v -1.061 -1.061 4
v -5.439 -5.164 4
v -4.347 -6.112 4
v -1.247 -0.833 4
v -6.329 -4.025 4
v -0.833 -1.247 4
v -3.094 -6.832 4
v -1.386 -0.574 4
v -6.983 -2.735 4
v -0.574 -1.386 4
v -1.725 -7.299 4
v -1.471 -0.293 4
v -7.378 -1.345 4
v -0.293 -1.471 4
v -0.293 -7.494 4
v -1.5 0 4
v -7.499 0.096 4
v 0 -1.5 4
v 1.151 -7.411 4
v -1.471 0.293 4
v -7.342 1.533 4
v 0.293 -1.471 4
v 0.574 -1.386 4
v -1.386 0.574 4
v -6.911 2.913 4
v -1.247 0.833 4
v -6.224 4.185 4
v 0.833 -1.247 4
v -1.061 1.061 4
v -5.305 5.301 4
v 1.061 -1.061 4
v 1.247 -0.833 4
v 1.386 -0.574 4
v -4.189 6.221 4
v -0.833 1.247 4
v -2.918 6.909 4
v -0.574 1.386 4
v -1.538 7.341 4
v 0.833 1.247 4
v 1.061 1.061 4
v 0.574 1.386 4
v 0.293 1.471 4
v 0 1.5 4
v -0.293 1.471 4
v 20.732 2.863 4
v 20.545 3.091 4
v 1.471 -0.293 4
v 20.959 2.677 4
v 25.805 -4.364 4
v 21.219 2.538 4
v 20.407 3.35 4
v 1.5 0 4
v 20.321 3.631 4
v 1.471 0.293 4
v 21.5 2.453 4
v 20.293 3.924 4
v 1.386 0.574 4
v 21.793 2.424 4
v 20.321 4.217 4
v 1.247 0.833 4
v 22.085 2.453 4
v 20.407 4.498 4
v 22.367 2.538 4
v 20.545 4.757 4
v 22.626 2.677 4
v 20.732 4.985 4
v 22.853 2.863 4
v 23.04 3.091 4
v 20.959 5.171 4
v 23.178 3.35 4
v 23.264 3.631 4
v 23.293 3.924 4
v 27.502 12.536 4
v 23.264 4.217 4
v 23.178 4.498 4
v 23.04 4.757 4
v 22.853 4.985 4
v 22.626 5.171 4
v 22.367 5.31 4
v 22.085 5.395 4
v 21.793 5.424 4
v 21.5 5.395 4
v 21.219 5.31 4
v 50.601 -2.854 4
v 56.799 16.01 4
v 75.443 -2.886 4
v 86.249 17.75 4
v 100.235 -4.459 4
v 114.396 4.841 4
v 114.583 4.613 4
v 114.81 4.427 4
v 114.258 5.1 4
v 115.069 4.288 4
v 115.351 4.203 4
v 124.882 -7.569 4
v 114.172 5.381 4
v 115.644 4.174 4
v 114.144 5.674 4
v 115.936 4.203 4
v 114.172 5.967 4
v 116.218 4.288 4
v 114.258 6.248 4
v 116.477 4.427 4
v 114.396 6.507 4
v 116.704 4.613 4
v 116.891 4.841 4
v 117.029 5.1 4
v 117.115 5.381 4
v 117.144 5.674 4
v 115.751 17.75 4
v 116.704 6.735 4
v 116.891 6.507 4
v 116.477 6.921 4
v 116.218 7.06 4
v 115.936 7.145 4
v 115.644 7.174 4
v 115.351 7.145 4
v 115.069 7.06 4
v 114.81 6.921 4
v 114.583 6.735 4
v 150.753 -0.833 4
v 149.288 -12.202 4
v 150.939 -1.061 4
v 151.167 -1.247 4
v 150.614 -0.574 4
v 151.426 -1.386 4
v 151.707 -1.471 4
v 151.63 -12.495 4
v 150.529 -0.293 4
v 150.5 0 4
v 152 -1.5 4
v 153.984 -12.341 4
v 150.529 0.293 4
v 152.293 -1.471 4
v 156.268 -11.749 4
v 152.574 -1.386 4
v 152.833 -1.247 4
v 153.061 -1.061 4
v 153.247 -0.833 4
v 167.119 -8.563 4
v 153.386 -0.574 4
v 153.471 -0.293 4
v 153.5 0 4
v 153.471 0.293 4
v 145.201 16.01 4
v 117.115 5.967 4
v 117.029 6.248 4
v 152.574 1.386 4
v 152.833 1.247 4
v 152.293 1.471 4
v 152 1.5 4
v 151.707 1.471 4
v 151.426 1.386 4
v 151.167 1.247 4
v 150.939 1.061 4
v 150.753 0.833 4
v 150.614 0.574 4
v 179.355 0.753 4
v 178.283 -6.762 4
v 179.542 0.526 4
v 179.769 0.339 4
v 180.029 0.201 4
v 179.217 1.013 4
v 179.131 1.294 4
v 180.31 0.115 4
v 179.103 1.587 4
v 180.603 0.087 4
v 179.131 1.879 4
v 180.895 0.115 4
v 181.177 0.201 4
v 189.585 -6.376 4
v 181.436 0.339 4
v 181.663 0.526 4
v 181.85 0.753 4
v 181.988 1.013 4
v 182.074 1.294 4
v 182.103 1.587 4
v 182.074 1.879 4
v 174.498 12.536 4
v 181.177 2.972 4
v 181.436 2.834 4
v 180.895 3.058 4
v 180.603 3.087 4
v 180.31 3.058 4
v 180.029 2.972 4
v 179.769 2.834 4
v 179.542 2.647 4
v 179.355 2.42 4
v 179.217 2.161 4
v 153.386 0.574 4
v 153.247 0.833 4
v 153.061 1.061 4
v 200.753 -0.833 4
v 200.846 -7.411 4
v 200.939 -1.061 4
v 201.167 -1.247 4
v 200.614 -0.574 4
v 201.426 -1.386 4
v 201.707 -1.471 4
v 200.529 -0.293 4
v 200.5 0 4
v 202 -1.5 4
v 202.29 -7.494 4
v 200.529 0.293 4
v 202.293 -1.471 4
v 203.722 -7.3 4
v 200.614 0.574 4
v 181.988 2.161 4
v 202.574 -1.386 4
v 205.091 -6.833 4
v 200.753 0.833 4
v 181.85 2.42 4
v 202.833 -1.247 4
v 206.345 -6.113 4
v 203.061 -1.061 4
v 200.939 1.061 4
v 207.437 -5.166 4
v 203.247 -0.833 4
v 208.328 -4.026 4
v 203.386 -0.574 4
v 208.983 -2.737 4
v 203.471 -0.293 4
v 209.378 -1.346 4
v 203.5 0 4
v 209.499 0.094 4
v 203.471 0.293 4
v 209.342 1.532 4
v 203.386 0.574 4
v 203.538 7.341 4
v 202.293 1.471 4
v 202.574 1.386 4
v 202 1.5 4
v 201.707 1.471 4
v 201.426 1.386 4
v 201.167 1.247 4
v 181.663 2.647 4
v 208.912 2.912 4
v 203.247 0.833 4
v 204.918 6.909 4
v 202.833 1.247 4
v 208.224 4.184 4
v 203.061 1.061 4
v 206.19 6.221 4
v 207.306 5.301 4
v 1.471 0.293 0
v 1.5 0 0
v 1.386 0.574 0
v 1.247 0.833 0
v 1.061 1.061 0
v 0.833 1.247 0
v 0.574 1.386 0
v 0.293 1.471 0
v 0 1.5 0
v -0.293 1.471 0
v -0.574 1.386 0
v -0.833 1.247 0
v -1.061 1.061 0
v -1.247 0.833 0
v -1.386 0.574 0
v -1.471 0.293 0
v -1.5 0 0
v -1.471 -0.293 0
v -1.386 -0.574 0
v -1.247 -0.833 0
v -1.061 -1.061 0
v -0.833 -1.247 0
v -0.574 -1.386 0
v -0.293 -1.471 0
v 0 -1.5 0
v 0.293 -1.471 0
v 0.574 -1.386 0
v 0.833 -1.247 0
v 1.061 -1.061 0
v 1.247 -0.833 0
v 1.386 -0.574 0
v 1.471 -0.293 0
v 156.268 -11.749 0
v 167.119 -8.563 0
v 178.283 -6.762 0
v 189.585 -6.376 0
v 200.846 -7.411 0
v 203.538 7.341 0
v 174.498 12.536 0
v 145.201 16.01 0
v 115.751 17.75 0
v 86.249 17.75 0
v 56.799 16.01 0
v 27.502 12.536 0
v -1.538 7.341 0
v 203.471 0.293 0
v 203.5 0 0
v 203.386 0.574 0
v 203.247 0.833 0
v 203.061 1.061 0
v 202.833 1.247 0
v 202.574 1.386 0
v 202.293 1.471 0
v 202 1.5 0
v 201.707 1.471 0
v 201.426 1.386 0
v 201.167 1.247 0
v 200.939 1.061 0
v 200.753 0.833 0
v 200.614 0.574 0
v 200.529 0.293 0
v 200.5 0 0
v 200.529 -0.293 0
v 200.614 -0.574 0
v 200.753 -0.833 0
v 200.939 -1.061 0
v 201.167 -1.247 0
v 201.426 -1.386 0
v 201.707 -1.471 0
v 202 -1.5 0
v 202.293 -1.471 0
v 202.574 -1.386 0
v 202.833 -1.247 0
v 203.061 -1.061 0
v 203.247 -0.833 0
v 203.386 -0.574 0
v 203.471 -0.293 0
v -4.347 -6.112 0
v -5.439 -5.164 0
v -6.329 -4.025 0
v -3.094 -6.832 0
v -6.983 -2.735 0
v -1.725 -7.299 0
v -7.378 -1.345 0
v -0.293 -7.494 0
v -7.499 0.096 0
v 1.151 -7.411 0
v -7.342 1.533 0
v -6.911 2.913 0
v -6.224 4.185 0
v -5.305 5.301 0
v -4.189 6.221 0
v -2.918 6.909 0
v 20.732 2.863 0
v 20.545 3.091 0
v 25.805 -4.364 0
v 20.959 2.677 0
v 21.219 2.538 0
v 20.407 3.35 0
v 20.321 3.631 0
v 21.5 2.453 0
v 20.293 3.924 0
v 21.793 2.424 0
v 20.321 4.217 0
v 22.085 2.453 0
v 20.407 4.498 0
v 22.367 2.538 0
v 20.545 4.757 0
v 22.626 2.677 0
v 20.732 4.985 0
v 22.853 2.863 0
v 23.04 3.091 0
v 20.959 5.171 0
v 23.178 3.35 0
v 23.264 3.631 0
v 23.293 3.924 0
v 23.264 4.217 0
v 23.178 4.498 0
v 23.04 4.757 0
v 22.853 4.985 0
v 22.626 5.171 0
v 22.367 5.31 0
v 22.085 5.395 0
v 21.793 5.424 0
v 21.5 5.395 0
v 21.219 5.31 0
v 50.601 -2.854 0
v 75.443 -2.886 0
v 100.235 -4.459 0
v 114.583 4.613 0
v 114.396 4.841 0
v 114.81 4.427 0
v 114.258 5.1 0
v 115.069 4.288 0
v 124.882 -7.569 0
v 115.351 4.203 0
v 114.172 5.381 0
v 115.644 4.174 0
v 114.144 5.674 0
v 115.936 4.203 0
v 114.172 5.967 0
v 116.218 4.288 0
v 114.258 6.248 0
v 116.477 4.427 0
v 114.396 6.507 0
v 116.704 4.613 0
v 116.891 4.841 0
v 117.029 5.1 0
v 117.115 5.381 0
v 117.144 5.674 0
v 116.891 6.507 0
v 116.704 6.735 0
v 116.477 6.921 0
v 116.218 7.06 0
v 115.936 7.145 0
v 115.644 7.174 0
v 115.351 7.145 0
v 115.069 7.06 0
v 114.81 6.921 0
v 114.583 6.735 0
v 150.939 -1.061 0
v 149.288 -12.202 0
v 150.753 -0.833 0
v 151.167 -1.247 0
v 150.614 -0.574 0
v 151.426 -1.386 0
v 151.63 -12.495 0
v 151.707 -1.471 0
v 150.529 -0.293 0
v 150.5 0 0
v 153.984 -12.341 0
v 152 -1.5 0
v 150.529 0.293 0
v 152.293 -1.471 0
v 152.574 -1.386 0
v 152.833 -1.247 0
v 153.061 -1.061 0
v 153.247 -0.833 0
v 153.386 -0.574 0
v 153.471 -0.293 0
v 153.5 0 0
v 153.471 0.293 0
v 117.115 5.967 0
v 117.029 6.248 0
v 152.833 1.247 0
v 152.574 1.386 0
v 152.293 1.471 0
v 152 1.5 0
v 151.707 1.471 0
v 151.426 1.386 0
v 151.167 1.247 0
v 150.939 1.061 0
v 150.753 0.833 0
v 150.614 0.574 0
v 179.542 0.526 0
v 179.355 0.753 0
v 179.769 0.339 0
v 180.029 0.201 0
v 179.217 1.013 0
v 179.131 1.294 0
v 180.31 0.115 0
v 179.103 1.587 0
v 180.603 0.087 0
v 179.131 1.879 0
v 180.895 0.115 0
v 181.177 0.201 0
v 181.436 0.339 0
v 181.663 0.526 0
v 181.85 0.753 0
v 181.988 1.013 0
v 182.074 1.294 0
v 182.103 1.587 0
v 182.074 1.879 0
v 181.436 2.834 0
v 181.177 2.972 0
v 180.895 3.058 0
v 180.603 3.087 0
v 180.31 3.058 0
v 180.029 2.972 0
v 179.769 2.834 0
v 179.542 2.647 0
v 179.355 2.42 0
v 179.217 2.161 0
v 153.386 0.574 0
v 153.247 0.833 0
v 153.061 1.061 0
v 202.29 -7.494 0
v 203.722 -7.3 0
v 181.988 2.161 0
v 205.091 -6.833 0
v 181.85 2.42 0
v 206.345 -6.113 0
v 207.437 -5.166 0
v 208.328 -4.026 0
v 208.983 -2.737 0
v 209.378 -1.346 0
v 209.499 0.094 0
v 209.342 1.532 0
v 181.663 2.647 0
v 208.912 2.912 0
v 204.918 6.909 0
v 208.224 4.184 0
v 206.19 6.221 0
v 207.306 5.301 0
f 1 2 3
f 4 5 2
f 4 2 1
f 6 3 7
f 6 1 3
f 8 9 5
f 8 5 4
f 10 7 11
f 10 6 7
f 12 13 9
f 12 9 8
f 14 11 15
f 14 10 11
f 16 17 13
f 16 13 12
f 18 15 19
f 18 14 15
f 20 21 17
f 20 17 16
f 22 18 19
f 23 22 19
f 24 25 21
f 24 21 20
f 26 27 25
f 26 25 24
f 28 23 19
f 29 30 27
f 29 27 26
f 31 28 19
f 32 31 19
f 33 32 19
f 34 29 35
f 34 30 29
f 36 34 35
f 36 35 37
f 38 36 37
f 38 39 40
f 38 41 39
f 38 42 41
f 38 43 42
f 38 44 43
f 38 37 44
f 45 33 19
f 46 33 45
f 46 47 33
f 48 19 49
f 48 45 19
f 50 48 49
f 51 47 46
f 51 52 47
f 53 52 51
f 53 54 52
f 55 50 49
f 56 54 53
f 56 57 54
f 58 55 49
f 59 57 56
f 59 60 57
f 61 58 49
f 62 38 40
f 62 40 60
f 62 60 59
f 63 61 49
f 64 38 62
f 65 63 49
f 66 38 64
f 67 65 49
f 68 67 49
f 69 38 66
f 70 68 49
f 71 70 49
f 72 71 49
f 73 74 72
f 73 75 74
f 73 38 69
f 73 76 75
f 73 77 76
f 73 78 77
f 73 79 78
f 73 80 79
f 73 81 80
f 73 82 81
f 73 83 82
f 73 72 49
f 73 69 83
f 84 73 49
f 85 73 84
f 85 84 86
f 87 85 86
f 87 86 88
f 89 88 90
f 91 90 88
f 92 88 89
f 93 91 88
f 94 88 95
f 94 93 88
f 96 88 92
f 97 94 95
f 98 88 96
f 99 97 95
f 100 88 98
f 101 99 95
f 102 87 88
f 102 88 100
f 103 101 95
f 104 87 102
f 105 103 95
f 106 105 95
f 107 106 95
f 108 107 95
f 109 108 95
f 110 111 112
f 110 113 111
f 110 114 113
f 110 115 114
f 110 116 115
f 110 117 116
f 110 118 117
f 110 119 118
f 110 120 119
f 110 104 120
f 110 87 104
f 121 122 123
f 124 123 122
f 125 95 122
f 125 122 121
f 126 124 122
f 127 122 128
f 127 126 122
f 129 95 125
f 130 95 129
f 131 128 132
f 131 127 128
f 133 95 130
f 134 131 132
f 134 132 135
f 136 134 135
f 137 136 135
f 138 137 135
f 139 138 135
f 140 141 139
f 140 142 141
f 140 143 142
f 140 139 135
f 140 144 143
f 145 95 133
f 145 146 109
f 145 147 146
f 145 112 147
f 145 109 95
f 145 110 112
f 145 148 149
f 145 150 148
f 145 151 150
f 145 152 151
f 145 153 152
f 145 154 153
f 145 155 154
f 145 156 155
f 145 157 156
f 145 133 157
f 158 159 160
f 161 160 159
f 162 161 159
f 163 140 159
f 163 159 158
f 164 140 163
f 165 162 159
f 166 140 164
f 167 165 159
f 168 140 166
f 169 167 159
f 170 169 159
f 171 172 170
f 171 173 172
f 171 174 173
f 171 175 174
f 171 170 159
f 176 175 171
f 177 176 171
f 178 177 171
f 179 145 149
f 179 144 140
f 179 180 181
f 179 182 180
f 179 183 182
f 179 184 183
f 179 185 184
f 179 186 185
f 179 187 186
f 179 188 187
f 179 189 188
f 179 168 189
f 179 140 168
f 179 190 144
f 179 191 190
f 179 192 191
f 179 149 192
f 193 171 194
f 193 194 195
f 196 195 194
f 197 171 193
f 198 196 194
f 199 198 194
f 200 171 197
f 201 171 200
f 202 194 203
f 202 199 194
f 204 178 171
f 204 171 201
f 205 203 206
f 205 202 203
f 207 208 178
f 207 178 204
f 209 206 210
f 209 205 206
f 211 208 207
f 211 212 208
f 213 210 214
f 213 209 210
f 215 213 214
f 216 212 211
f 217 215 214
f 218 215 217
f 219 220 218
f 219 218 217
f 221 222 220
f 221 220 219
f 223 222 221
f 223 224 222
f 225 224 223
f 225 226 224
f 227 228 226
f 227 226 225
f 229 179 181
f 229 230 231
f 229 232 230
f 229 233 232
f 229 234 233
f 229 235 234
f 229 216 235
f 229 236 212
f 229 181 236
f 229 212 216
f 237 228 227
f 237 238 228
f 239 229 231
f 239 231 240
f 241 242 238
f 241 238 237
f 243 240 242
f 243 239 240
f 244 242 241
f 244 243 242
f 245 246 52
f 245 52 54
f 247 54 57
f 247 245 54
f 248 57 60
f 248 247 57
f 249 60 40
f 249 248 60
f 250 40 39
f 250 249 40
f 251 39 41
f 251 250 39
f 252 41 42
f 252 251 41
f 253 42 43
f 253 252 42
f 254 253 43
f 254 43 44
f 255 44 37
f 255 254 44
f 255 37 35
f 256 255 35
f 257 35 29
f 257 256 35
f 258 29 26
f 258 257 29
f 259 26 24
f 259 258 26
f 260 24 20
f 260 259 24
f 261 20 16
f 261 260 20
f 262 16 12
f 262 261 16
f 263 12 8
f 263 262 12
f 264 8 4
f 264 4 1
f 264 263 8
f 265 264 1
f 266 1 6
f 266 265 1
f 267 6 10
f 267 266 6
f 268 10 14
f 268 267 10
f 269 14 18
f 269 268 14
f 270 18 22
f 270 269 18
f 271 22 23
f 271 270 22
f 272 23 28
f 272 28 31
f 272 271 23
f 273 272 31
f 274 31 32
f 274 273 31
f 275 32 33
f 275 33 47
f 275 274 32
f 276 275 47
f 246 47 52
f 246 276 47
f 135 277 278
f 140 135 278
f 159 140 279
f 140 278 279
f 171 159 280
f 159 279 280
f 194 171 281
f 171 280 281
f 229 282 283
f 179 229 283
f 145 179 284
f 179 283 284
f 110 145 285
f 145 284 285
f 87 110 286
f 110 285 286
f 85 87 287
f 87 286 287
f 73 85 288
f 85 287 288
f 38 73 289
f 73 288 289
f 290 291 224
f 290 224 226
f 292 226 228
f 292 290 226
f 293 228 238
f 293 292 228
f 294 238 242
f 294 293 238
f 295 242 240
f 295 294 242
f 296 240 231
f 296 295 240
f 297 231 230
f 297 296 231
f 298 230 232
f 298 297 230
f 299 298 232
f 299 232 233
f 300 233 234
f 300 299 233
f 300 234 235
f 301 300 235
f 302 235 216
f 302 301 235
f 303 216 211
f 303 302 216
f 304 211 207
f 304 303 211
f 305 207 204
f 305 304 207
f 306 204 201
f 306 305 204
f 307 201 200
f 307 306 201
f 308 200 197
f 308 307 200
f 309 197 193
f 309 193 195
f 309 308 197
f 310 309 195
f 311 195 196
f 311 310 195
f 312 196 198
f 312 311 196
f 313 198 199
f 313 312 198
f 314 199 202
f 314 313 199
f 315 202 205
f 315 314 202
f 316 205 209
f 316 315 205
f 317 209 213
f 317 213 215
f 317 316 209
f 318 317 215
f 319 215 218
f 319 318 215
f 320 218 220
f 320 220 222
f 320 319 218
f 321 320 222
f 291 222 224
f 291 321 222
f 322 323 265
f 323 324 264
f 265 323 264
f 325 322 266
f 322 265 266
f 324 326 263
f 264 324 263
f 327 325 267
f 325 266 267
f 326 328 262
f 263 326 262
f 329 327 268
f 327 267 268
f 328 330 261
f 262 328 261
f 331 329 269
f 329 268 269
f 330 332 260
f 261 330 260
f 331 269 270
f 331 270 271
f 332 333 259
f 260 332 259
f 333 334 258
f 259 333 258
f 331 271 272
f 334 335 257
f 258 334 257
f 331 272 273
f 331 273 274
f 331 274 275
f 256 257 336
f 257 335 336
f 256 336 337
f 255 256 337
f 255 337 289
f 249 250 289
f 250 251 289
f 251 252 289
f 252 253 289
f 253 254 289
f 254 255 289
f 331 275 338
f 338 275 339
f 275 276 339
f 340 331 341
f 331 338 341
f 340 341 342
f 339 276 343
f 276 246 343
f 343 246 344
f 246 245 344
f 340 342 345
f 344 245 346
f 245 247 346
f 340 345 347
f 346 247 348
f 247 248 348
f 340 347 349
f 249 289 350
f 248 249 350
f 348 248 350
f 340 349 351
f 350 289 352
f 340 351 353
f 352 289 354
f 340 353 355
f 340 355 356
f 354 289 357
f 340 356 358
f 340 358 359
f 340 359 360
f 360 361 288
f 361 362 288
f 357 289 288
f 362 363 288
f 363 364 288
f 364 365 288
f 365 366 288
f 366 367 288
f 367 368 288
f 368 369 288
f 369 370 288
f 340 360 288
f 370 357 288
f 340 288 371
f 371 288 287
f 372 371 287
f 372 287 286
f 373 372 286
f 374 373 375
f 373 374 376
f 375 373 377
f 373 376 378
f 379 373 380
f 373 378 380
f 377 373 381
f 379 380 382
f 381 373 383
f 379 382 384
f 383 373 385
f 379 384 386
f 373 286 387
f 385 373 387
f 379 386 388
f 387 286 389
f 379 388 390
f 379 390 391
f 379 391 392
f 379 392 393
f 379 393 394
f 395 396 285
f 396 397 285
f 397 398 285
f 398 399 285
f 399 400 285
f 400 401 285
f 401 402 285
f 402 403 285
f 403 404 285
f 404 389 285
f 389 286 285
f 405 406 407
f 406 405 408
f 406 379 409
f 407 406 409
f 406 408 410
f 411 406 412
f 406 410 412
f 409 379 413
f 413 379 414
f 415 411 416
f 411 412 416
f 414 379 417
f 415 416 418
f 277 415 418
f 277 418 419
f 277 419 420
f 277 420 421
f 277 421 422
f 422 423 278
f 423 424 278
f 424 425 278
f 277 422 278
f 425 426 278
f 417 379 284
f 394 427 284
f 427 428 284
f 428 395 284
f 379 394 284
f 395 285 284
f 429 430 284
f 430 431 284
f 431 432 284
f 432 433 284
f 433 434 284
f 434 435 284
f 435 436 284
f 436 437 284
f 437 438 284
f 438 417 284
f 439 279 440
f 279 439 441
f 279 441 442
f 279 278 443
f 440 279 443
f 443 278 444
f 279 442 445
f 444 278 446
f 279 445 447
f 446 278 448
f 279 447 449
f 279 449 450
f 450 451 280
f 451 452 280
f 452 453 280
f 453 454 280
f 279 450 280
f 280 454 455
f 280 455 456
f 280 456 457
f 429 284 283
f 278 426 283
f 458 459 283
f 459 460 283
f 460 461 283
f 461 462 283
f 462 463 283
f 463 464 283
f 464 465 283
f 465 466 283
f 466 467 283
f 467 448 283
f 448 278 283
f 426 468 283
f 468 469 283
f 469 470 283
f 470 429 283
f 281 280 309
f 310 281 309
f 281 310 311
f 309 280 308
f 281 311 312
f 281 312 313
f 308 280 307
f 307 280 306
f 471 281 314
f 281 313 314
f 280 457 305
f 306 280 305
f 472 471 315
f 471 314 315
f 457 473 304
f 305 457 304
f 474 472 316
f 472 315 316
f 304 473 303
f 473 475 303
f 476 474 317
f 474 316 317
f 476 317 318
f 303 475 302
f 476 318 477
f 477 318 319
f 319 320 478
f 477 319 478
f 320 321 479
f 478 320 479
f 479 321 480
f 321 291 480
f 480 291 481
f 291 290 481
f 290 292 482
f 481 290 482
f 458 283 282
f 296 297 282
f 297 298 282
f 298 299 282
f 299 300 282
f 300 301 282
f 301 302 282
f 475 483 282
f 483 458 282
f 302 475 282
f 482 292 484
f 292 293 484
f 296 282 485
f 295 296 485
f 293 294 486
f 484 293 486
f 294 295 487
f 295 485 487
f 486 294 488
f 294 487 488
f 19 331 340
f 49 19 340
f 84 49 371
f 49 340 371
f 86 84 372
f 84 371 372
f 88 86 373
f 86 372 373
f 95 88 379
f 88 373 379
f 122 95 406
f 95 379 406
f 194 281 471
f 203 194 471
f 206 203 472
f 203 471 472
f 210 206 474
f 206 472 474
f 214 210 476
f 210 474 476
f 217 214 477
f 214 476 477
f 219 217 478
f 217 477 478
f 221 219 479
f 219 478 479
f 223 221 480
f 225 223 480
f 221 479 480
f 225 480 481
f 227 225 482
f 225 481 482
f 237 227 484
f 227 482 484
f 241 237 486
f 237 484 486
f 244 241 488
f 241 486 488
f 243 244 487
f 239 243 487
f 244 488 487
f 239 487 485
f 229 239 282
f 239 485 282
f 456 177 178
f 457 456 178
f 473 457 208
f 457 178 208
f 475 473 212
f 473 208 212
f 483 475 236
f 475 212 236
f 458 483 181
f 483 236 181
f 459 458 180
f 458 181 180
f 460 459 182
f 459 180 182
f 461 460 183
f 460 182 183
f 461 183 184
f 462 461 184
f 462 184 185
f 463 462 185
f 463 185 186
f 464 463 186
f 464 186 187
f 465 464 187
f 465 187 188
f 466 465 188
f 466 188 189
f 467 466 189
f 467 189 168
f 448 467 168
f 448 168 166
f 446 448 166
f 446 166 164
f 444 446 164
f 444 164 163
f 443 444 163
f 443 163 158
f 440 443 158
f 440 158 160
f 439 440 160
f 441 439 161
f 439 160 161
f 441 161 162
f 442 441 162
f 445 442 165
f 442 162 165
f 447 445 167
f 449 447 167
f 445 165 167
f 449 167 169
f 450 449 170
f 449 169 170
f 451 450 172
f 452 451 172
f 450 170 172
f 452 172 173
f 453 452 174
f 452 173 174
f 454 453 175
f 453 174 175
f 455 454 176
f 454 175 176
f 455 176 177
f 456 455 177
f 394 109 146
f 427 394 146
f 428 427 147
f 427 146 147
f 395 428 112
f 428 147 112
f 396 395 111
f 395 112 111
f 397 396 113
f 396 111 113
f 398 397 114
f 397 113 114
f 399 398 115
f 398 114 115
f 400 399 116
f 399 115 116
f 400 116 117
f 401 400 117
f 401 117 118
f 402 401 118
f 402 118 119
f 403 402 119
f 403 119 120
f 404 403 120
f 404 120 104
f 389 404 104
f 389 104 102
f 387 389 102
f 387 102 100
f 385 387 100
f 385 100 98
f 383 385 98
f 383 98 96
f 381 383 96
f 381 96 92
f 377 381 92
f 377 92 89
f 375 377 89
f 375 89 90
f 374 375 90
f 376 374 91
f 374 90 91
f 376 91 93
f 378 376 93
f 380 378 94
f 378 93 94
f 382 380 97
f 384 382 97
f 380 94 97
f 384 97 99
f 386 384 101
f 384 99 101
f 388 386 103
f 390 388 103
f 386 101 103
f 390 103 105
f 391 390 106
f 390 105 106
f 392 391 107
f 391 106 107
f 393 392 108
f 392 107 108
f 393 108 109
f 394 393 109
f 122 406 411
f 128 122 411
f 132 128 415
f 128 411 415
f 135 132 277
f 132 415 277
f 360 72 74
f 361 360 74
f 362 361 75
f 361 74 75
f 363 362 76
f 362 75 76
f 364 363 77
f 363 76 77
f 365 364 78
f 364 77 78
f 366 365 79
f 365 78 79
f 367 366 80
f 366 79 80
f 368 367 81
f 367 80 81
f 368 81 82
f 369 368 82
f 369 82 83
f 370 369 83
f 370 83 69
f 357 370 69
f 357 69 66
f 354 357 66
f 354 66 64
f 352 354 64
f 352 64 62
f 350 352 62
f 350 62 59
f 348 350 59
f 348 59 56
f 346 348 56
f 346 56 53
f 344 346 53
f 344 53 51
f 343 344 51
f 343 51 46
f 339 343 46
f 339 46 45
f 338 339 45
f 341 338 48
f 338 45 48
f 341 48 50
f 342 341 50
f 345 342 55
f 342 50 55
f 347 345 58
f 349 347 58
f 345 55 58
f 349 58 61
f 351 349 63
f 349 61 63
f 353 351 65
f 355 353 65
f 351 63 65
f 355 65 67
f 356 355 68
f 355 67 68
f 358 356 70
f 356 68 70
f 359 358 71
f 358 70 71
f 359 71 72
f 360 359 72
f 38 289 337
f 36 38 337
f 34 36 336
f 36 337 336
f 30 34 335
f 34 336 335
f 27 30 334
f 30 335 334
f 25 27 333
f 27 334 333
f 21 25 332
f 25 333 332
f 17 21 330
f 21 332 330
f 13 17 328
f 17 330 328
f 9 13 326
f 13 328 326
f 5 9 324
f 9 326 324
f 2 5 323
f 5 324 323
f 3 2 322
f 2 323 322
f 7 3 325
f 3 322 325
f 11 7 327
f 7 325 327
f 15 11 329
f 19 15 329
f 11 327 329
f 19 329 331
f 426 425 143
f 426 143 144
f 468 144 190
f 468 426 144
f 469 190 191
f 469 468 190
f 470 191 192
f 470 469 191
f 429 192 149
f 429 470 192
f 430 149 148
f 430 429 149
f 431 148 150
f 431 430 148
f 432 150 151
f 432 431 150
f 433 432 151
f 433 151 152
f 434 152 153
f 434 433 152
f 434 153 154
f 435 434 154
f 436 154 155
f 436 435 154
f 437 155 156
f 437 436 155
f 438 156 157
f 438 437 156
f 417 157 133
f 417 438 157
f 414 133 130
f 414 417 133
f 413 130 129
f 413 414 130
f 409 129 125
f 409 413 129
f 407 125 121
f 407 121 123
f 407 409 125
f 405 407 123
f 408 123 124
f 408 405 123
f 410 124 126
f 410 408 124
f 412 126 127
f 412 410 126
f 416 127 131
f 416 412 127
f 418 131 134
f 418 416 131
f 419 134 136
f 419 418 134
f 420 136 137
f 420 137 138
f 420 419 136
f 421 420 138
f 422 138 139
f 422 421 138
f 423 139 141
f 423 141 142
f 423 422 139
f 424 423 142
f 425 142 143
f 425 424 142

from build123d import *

# Parameters (mm, degrees)
SCHIZZO1_R                   = 1.5
ESTRUSIONE_ESTRUSIONE1_DEPTH = 4
SCHIZZO2_R                   = 1.5
TAGLIO_ESTRUSIONE1_DEPTH     = 10


with BuildPart() as part:
    # Schizzo1 → Estrusione-Estrusione1 (new body)
    with BuildSketch(Plane.XY):
        with BuildLine():
            ThreePointArc((-1.538071066, 7.340595166), (-7.378454008, -1.344773756), (1.150548918, -7.411223731))
            ThreePointArc((1.150548918, -7.411223731), (75.443261143, -2.885528453), (149.288277512, -12.20231786))
            ThreePointArc((149.288277512, -12.20231786), (152.810661847, -12.473685396), (156.268292683, -11.748688334))
            ThreePointArc((156.268292683, -11.748688334), (178.283063002, -6.762377854), (200.846153846, -7.410711103))
            ThreePointArc((200.846153846, -7.410711103), (209.378154672, -1.346415107), (203.538071066, 7.340595166))
            ThreePointArc((203.538071066, 7.340595166), (101, 17.967584078), (-1.538071066, 7.340595166))
        make_face()
        Circle(SCHIZZO1_R, mode=Mode.SUBTRACT)
        with Locations((202, 0)):
            Circle(SCHIZZO1_R, mode=Mode.SUBTRACT)
        with Locations((152, 0)):
            Circle(SCHIZZO1_R, mode=Mode.SUBTRACT)
    extrude(amount=ESTRUSIONE_ESTRUSIONE1_DEPTH)

    # Schizzo2 → Taglio-Estrusione1 (cut)
    with BuildSketch(Plane.XY.offset(4)):
        with Locations((21.792647349, 3.923925867)):
            Circle(SCHIZZO2_R)
        with Locations((115.643522851, 5.673925867)):
            Circle(SCHIZZO2_R)
        with Locations((180.602574062, 1.58663817)):
            Circle(SCHIZZO2_R)
    extrude(amount=-TAGLIO_ESTRUSIONE1_DEPTH, mode=Mode.SUBTRACT)


solid = part.part
